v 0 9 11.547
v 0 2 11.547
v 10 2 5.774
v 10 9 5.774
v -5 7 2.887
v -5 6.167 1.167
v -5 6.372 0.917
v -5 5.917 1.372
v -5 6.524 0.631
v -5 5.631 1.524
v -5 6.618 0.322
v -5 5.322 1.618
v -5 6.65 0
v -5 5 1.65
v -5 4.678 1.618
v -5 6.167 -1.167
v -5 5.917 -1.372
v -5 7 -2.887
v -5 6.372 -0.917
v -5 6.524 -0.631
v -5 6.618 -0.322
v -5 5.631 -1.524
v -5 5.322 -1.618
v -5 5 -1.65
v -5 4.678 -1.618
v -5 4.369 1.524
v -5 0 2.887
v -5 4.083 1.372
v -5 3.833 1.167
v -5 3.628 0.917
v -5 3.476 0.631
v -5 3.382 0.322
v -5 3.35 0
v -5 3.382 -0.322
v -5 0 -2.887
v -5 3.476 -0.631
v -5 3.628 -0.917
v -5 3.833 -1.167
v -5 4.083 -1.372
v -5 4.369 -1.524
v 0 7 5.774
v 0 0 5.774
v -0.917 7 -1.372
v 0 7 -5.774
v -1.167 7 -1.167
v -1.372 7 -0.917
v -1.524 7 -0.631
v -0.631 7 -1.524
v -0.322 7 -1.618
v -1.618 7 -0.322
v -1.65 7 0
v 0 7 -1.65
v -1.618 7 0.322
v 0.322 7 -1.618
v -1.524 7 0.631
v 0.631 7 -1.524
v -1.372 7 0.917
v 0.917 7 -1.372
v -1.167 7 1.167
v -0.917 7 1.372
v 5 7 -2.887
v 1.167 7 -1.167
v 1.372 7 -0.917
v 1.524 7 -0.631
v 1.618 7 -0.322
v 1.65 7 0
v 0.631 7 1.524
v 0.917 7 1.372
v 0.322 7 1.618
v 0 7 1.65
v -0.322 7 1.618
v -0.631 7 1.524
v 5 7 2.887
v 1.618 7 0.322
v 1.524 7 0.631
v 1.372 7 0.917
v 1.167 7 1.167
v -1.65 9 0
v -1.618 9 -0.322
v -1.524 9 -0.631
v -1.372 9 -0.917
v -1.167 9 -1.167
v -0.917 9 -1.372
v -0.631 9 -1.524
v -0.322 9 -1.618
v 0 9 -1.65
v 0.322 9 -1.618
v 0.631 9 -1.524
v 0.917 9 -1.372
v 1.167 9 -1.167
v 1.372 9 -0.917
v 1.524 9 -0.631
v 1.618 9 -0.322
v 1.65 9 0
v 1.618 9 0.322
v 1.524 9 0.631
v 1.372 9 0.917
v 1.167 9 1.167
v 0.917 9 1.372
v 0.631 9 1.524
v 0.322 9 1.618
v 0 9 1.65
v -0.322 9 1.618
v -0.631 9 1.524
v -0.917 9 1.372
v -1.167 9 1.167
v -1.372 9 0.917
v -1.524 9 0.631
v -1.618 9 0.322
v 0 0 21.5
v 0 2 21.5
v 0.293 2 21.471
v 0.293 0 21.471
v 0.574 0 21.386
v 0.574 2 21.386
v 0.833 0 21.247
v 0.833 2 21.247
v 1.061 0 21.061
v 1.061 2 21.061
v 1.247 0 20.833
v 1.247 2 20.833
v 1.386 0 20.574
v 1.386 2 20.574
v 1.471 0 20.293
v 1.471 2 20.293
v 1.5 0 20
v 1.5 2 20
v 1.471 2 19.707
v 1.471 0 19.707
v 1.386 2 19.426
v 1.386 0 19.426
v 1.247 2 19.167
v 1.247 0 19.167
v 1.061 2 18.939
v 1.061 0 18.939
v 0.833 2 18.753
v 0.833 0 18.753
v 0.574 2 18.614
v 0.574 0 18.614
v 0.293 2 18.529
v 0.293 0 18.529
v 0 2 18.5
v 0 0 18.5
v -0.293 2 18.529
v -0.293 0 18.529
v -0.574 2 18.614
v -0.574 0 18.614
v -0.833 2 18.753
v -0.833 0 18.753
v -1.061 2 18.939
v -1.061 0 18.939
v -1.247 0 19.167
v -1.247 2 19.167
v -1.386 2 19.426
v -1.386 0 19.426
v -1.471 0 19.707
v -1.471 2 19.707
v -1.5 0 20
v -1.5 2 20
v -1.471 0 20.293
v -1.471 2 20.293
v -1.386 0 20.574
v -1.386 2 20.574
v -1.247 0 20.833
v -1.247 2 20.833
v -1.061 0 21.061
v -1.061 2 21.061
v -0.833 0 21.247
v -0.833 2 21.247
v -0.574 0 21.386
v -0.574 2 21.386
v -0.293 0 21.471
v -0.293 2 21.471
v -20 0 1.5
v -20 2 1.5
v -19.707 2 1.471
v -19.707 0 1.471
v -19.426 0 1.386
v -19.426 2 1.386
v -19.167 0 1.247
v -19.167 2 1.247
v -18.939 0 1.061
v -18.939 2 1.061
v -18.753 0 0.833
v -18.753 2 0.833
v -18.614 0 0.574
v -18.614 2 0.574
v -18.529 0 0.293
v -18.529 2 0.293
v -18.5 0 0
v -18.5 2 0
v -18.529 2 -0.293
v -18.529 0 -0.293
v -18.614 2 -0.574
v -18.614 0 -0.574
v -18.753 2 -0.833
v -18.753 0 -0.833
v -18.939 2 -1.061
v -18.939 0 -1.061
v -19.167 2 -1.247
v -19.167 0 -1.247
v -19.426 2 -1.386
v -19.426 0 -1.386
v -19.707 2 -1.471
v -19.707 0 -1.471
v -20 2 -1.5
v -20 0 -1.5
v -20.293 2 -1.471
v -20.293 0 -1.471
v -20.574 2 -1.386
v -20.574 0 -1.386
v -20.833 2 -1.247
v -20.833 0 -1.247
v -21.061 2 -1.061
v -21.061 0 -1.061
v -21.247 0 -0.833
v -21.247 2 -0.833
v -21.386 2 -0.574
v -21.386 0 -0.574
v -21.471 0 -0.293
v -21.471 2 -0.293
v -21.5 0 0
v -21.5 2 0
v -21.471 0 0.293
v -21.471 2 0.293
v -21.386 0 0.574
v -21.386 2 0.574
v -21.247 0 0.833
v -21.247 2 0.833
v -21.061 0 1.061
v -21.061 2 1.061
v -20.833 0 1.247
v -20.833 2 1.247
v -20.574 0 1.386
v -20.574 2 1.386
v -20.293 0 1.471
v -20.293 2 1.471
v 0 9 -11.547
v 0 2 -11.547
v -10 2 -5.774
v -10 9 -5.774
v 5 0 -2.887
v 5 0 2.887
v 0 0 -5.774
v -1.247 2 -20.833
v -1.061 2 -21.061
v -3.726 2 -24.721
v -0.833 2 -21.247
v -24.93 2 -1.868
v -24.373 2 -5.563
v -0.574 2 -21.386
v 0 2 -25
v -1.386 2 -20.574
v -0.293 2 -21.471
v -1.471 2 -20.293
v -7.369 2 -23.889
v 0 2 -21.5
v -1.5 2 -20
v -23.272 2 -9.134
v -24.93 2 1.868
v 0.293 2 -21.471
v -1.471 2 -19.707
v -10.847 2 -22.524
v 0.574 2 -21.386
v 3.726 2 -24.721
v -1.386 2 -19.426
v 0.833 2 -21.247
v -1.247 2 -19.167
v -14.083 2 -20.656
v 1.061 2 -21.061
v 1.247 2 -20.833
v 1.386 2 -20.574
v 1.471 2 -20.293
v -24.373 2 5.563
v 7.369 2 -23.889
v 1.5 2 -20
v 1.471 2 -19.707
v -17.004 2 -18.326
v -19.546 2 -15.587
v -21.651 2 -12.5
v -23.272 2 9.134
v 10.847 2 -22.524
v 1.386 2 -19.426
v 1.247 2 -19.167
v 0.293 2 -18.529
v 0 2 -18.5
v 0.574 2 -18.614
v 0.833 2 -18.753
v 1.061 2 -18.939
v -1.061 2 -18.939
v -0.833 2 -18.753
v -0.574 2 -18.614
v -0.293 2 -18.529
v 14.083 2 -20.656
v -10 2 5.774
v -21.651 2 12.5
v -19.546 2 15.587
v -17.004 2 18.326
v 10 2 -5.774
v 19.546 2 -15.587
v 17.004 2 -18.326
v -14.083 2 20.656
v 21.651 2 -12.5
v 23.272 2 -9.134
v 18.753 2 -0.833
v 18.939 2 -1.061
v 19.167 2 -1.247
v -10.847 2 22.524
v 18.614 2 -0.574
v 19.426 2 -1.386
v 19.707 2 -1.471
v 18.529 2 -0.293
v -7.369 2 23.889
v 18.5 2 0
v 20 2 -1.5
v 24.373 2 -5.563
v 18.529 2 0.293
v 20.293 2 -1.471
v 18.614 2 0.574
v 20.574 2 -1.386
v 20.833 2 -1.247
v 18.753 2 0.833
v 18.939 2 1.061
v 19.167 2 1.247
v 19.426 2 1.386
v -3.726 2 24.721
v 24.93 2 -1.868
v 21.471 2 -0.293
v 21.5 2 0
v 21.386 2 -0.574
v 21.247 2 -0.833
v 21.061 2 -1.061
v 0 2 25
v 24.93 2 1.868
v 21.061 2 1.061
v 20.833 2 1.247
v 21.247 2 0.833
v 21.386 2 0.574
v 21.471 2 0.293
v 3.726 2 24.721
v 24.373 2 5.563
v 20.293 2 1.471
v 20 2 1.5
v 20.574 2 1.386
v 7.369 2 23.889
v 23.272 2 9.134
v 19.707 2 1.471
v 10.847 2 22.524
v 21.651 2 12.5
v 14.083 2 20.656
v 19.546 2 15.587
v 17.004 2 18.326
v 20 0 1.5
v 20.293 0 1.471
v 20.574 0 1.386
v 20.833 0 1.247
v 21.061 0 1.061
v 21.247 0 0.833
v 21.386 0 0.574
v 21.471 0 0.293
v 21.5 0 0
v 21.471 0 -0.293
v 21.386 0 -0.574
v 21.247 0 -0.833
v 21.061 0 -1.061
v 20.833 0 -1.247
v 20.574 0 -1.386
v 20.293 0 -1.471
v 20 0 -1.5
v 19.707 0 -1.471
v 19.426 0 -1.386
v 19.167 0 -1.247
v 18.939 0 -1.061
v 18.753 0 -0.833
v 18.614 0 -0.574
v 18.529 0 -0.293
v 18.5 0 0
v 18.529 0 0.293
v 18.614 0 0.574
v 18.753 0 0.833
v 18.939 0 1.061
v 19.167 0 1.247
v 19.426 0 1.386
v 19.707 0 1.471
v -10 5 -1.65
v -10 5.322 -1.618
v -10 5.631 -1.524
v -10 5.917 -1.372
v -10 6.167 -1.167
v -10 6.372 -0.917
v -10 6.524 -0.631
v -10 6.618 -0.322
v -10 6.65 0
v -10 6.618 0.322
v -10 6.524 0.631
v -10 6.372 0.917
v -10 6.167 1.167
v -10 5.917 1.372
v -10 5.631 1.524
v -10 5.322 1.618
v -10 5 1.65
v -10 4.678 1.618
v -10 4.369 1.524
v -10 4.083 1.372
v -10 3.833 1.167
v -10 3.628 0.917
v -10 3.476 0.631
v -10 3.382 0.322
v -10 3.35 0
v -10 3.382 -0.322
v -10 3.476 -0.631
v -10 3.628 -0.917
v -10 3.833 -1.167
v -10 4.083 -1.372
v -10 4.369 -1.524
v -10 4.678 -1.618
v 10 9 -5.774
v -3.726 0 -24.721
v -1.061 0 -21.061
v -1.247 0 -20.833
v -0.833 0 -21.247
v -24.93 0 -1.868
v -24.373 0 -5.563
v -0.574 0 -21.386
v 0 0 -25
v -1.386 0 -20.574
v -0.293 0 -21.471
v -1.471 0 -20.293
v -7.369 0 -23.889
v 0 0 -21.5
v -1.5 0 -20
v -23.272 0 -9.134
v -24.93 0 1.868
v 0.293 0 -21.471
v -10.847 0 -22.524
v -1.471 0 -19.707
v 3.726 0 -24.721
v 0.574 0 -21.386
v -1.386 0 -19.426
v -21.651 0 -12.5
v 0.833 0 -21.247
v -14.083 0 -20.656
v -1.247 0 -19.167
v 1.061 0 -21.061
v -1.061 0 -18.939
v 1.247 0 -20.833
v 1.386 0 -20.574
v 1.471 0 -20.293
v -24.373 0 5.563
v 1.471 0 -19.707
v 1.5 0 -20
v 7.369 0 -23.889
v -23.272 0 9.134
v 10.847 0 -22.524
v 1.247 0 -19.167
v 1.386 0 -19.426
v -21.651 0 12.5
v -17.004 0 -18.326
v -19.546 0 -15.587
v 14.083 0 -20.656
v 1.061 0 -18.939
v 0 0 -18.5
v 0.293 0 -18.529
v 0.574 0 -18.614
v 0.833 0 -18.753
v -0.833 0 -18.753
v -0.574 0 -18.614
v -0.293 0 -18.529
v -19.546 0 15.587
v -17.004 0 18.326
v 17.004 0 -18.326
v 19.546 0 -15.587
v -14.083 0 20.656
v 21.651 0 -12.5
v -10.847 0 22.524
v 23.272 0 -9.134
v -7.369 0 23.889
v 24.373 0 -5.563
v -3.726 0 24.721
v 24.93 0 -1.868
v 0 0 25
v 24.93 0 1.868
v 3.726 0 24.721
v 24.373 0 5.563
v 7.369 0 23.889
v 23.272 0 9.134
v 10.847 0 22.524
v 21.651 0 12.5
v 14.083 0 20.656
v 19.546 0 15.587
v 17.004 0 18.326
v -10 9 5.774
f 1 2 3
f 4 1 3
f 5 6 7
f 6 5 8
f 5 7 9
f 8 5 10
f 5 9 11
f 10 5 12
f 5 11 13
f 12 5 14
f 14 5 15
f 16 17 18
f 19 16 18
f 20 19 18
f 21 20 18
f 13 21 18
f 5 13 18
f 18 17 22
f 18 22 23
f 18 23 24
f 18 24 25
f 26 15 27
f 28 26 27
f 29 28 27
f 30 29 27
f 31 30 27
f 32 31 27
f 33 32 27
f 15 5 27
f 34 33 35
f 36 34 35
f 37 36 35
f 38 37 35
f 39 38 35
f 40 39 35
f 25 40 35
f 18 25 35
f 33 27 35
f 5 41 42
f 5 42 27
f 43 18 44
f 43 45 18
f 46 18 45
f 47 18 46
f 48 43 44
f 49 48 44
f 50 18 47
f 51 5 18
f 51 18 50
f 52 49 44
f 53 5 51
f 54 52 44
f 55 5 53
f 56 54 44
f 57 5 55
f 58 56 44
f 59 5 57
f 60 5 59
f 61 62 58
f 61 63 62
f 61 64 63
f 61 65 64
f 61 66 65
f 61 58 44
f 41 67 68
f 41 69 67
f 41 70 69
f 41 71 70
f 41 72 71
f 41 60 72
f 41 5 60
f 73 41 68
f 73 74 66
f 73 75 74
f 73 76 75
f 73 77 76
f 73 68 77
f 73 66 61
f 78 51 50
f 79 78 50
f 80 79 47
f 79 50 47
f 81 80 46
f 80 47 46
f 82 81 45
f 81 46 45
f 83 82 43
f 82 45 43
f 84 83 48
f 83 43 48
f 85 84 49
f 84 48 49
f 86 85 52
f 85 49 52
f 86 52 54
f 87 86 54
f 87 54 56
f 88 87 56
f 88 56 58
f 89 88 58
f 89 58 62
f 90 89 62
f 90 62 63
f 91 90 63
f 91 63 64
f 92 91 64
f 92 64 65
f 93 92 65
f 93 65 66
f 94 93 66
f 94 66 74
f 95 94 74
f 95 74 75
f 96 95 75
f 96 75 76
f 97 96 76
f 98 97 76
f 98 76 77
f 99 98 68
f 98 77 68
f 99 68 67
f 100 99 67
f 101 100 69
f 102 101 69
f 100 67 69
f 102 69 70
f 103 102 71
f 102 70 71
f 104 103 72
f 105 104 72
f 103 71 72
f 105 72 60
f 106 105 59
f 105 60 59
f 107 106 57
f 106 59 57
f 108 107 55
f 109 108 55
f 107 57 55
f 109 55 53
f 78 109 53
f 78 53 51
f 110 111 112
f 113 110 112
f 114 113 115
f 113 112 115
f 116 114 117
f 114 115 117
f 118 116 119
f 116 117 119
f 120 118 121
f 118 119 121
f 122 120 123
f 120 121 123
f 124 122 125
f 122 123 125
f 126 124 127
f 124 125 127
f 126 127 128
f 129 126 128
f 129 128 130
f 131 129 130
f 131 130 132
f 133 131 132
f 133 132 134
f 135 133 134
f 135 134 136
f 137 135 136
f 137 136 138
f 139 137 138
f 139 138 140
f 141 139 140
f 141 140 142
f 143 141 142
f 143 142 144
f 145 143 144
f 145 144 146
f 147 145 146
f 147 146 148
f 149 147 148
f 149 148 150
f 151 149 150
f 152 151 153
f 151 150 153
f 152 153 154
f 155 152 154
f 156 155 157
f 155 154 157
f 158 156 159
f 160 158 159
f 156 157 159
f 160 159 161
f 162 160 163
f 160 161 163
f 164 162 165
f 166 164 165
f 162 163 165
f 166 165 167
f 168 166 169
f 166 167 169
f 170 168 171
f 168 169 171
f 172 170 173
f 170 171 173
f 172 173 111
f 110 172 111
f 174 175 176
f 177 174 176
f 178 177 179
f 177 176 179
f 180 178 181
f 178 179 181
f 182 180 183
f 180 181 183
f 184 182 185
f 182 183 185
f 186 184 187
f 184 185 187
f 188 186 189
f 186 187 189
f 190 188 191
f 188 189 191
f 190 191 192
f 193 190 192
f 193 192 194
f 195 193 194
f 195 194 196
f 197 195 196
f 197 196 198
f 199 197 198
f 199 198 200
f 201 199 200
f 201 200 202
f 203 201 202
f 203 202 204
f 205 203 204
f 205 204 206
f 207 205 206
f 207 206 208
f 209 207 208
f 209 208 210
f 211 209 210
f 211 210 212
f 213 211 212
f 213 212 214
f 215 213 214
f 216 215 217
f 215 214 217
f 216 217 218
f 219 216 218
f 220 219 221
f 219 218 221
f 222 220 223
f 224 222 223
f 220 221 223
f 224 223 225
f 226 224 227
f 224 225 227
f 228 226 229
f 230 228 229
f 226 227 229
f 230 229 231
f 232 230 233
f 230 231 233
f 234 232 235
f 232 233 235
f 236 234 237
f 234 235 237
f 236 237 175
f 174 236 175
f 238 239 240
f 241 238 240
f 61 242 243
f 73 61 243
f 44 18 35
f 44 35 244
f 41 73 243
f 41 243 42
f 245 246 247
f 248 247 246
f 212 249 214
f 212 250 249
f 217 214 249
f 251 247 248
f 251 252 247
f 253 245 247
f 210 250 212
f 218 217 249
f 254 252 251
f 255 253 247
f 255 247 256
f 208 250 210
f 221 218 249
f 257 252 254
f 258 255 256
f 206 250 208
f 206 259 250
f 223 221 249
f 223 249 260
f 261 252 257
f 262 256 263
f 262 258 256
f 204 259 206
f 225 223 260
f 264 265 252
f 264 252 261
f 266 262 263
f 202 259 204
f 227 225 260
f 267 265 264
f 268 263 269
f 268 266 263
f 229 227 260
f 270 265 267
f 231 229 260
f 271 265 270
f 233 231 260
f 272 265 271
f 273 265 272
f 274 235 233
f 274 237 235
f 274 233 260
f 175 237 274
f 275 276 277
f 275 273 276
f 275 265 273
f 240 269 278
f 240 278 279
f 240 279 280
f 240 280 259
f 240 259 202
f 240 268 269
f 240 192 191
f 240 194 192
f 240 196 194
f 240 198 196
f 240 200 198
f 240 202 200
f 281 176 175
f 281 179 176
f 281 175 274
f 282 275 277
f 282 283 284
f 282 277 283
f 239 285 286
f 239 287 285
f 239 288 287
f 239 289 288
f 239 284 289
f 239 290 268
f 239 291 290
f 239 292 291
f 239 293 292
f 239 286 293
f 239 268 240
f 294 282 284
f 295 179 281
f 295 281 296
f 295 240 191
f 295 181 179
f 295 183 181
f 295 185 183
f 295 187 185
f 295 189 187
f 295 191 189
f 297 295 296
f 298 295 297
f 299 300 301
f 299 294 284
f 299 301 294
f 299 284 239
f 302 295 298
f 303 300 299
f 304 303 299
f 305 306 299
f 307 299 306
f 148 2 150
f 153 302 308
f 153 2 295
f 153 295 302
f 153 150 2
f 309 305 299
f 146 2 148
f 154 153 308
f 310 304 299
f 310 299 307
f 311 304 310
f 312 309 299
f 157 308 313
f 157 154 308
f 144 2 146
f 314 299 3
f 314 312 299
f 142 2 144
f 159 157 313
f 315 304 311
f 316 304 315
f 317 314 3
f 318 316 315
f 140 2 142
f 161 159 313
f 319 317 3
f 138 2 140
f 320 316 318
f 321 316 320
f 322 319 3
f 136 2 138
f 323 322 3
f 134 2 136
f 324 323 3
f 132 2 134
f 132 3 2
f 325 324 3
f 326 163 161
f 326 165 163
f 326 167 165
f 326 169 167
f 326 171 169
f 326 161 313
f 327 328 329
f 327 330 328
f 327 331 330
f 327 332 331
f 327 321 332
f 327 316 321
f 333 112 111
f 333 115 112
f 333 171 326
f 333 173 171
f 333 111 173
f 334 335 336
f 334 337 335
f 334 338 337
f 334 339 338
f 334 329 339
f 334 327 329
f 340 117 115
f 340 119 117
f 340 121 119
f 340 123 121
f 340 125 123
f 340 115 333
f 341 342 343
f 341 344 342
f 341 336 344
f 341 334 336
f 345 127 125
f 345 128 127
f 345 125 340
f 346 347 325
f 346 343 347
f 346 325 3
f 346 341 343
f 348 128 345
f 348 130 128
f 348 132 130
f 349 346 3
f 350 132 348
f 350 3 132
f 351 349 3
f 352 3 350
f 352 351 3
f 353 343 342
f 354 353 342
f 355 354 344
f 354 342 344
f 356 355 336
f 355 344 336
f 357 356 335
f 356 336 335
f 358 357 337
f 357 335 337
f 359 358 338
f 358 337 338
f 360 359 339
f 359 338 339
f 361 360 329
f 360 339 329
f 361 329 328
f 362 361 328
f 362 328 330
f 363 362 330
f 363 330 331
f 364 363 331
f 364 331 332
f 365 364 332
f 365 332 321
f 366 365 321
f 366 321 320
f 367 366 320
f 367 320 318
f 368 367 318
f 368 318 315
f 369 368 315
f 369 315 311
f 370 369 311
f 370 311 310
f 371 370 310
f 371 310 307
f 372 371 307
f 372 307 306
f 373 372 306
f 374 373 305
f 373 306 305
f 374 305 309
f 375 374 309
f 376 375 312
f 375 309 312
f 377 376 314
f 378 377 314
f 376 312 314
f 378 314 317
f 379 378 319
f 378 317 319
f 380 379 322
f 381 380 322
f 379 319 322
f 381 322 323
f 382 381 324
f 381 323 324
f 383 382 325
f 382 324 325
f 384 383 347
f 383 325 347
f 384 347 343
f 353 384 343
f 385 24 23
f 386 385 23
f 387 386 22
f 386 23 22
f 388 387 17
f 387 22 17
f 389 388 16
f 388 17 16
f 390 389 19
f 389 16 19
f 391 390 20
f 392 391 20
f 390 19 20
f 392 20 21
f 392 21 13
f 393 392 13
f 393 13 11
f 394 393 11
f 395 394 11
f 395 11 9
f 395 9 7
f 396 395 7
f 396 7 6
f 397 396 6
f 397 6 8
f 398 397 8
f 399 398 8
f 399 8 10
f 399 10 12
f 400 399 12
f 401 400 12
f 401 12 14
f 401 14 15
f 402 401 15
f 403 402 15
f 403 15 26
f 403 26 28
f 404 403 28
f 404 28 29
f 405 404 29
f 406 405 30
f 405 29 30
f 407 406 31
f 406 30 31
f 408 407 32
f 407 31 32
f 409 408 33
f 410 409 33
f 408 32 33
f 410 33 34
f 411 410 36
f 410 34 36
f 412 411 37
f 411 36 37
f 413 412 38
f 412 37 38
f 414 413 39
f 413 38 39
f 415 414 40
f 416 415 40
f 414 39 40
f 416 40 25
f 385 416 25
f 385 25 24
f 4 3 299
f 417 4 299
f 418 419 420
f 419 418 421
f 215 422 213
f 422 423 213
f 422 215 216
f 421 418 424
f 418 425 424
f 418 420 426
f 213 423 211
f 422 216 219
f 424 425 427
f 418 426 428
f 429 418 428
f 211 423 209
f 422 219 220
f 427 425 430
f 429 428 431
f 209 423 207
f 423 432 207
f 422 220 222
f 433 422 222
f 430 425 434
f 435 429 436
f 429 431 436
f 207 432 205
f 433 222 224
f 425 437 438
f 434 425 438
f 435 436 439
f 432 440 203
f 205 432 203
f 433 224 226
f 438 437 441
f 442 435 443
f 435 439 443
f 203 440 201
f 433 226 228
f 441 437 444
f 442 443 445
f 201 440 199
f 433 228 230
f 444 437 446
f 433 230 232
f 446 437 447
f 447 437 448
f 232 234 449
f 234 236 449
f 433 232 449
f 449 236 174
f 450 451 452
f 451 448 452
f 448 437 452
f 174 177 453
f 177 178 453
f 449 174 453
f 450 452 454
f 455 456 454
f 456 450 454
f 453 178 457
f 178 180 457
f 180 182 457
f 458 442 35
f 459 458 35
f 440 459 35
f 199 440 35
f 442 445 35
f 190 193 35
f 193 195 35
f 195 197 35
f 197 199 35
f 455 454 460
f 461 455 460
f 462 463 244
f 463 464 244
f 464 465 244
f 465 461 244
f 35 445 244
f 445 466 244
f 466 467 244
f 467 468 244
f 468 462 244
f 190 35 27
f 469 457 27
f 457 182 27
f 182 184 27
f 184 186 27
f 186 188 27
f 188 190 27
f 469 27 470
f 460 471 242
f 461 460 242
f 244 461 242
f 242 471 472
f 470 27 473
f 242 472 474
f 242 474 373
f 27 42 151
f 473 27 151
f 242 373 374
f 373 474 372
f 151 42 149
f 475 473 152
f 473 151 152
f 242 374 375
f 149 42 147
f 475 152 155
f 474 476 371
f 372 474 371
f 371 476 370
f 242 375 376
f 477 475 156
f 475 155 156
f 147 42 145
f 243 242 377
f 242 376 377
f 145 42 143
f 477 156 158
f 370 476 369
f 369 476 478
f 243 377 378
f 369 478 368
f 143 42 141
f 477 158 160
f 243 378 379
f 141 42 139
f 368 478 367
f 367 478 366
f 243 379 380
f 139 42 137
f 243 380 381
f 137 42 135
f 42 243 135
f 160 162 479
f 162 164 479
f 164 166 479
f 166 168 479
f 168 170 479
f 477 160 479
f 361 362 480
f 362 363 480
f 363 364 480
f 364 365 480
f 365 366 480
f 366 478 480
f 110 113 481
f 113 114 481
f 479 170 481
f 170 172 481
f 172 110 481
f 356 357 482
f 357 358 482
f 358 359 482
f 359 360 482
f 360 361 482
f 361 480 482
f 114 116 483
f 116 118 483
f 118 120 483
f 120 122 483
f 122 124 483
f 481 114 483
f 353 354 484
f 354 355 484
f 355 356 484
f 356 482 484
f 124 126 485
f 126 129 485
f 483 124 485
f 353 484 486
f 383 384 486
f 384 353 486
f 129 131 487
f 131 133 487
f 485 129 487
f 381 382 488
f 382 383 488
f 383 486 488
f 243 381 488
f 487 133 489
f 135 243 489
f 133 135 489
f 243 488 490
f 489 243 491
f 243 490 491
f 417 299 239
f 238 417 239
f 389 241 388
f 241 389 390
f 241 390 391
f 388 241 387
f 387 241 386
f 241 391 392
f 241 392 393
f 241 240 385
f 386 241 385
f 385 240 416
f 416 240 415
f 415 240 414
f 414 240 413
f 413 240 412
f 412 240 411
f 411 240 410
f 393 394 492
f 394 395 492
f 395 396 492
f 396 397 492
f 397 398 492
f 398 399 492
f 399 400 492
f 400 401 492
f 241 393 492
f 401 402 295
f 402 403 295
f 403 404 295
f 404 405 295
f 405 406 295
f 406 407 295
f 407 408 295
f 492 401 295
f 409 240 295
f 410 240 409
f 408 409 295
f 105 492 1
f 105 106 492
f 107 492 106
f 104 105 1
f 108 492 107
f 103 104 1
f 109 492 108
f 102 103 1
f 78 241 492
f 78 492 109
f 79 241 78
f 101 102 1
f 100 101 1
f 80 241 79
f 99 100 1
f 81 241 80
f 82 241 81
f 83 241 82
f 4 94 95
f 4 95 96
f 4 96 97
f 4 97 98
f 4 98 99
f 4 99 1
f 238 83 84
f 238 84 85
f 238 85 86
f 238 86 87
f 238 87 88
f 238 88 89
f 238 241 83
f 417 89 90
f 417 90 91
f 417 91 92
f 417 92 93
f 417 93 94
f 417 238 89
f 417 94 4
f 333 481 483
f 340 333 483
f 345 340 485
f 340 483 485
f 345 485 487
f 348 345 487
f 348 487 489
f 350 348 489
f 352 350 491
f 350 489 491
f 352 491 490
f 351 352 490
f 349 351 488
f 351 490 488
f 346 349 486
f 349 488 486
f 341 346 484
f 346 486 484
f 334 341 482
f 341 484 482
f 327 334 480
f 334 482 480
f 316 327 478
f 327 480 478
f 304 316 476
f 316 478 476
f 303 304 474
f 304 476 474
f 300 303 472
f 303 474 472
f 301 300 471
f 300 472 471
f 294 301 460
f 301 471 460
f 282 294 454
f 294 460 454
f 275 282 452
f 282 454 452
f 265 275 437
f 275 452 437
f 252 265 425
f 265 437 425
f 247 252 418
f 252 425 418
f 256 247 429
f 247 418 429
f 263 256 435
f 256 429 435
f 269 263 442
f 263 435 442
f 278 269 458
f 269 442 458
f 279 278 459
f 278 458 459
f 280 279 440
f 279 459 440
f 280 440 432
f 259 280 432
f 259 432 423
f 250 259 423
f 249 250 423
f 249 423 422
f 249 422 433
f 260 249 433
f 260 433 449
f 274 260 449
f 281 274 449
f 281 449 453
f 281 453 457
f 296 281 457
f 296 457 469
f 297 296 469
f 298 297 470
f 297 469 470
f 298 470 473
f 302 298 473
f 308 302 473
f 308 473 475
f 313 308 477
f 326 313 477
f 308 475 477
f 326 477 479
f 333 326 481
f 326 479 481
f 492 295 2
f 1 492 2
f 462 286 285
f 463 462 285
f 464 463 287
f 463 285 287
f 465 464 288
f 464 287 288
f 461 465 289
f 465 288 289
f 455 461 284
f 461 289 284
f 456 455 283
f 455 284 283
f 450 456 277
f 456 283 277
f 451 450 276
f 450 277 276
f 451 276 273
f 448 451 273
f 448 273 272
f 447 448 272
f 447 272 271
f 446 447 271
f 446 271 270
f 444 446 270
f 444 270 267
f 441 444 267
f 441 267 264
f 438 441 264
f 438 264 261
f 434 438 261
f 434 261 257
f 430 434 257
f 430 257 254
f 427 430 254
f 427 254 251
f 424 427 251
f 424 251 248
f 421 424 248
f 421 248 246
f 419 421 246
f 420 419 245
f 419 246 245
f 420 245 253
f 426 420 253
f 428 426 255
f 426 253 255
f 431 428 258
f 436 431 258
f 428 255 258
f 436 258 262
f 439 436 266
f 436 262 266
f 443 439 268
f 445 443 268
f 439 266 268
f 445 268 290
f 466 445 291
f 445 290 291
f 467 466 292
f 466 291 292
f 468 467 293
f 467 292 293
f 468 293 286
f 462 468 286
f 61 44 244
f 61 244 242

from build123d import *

# Parameters (mm, degrees)
SKETCH1_R             = 25
BOSS_EXTRUDE1_DEPTH   = 2
SKETCH2_R             = 1.5
CUT_EXTRUDE1_DEPTH    = 3
BOSS_EXTRUDE2_DEPTH   = 7
CUT_EXTRUDE2_DEPTH    = 7
M4_TAPPED_HOLE1_D     = 3.3
M4_TAPPED_HOLE1_DEPTH = 5
M4_TAPPED_HOLE2_D     = 3.3


with BuildPart() as part:
    # Sketch1 → Boss-Extrude1 (new body)
    with BuildSketch(Plane(origin=(0, 0, 0), x_dir=(1, 0, 0), z_dir=(0, 1, 0))):
        with Locations(Location((0, 0, 0), (0, 0, 270))):
            Circle(SKETCH1_R)
    extrude(amount=BOSS_EXTRUDE1_DEPTH)

    # Sketch2 → Cut-Extrude1 (cut)
    with BuildSketch(Plane(origin=(0, 2, 0), x_dir=(1, 0, 0), z_dir=(0, 1, 0))):
        with Locations(Location((0, 20, 0), (0, 0, 270))):
            Circle(SKETCH2_R)
        with Locations(Location((20, 0, 0), (0, 0, 270))):
            Circle(SKETCH2_R)
        with Locations(Location((0, -20, 0), (0, 0, 270))):
            Circle(SKETCH2_R)
        with Locations(Location((-20, 0, 0), (0, 0, 270))):
            Circle(SKETCH2_R)
    extrude(amount=-CUT_EXTRUDE1_DEPTH, mode=Mode.SUBTRACT)

    # Sketch3 → Boss-Extrude2 (add)
    with BuildSketch(Plane(origin=(0, 2, 0), x_dir=(1, 0, 0), z_dir=(0, 1, 0))):
        Polygon((0, 11.547005384), (-10, 5.773502692), (-10, -5.773502692), (0, -11.547005384), (10, -5.773502692), (10, 5.773502692), align=None)
    extrude(amount=BOSS_EXTRUDE2_DEPTH)

    # Sketch4 → Cut-Extrude2 (cut)
    with BuildSketch(Plane.XZ):
        Polygon((0, 5.773502692), (-5, 2.886751346), (-5, -2.886751346), (0, -5.773502692), (5, -2.886751346), (5, 2.886751346), align=None)
    extrude(amount=-CUT_EXTRUDE2_DEPTH, mode=Mode.SUBTRACT)

    # M4 Tapped Hole1
    with Locations(Plane.ZY.offset(10)):
        with Locations((0, 5)):
            Hole(M4_TAPPED_HOLE1_D / 2, depth=M4_TAPPED_HOLE1_DEPTH)

    # M4 Tapped Hole2 (through all)
    with Locations(Plane(origin=(0, 9, 0), x_dir=(1, 0, 0), z_dir=(0, 1, 0))):
        with Locations((0, 0)):
            Hole(M4_TAPPED_HOLE2_D / 2)


solid = part.part
